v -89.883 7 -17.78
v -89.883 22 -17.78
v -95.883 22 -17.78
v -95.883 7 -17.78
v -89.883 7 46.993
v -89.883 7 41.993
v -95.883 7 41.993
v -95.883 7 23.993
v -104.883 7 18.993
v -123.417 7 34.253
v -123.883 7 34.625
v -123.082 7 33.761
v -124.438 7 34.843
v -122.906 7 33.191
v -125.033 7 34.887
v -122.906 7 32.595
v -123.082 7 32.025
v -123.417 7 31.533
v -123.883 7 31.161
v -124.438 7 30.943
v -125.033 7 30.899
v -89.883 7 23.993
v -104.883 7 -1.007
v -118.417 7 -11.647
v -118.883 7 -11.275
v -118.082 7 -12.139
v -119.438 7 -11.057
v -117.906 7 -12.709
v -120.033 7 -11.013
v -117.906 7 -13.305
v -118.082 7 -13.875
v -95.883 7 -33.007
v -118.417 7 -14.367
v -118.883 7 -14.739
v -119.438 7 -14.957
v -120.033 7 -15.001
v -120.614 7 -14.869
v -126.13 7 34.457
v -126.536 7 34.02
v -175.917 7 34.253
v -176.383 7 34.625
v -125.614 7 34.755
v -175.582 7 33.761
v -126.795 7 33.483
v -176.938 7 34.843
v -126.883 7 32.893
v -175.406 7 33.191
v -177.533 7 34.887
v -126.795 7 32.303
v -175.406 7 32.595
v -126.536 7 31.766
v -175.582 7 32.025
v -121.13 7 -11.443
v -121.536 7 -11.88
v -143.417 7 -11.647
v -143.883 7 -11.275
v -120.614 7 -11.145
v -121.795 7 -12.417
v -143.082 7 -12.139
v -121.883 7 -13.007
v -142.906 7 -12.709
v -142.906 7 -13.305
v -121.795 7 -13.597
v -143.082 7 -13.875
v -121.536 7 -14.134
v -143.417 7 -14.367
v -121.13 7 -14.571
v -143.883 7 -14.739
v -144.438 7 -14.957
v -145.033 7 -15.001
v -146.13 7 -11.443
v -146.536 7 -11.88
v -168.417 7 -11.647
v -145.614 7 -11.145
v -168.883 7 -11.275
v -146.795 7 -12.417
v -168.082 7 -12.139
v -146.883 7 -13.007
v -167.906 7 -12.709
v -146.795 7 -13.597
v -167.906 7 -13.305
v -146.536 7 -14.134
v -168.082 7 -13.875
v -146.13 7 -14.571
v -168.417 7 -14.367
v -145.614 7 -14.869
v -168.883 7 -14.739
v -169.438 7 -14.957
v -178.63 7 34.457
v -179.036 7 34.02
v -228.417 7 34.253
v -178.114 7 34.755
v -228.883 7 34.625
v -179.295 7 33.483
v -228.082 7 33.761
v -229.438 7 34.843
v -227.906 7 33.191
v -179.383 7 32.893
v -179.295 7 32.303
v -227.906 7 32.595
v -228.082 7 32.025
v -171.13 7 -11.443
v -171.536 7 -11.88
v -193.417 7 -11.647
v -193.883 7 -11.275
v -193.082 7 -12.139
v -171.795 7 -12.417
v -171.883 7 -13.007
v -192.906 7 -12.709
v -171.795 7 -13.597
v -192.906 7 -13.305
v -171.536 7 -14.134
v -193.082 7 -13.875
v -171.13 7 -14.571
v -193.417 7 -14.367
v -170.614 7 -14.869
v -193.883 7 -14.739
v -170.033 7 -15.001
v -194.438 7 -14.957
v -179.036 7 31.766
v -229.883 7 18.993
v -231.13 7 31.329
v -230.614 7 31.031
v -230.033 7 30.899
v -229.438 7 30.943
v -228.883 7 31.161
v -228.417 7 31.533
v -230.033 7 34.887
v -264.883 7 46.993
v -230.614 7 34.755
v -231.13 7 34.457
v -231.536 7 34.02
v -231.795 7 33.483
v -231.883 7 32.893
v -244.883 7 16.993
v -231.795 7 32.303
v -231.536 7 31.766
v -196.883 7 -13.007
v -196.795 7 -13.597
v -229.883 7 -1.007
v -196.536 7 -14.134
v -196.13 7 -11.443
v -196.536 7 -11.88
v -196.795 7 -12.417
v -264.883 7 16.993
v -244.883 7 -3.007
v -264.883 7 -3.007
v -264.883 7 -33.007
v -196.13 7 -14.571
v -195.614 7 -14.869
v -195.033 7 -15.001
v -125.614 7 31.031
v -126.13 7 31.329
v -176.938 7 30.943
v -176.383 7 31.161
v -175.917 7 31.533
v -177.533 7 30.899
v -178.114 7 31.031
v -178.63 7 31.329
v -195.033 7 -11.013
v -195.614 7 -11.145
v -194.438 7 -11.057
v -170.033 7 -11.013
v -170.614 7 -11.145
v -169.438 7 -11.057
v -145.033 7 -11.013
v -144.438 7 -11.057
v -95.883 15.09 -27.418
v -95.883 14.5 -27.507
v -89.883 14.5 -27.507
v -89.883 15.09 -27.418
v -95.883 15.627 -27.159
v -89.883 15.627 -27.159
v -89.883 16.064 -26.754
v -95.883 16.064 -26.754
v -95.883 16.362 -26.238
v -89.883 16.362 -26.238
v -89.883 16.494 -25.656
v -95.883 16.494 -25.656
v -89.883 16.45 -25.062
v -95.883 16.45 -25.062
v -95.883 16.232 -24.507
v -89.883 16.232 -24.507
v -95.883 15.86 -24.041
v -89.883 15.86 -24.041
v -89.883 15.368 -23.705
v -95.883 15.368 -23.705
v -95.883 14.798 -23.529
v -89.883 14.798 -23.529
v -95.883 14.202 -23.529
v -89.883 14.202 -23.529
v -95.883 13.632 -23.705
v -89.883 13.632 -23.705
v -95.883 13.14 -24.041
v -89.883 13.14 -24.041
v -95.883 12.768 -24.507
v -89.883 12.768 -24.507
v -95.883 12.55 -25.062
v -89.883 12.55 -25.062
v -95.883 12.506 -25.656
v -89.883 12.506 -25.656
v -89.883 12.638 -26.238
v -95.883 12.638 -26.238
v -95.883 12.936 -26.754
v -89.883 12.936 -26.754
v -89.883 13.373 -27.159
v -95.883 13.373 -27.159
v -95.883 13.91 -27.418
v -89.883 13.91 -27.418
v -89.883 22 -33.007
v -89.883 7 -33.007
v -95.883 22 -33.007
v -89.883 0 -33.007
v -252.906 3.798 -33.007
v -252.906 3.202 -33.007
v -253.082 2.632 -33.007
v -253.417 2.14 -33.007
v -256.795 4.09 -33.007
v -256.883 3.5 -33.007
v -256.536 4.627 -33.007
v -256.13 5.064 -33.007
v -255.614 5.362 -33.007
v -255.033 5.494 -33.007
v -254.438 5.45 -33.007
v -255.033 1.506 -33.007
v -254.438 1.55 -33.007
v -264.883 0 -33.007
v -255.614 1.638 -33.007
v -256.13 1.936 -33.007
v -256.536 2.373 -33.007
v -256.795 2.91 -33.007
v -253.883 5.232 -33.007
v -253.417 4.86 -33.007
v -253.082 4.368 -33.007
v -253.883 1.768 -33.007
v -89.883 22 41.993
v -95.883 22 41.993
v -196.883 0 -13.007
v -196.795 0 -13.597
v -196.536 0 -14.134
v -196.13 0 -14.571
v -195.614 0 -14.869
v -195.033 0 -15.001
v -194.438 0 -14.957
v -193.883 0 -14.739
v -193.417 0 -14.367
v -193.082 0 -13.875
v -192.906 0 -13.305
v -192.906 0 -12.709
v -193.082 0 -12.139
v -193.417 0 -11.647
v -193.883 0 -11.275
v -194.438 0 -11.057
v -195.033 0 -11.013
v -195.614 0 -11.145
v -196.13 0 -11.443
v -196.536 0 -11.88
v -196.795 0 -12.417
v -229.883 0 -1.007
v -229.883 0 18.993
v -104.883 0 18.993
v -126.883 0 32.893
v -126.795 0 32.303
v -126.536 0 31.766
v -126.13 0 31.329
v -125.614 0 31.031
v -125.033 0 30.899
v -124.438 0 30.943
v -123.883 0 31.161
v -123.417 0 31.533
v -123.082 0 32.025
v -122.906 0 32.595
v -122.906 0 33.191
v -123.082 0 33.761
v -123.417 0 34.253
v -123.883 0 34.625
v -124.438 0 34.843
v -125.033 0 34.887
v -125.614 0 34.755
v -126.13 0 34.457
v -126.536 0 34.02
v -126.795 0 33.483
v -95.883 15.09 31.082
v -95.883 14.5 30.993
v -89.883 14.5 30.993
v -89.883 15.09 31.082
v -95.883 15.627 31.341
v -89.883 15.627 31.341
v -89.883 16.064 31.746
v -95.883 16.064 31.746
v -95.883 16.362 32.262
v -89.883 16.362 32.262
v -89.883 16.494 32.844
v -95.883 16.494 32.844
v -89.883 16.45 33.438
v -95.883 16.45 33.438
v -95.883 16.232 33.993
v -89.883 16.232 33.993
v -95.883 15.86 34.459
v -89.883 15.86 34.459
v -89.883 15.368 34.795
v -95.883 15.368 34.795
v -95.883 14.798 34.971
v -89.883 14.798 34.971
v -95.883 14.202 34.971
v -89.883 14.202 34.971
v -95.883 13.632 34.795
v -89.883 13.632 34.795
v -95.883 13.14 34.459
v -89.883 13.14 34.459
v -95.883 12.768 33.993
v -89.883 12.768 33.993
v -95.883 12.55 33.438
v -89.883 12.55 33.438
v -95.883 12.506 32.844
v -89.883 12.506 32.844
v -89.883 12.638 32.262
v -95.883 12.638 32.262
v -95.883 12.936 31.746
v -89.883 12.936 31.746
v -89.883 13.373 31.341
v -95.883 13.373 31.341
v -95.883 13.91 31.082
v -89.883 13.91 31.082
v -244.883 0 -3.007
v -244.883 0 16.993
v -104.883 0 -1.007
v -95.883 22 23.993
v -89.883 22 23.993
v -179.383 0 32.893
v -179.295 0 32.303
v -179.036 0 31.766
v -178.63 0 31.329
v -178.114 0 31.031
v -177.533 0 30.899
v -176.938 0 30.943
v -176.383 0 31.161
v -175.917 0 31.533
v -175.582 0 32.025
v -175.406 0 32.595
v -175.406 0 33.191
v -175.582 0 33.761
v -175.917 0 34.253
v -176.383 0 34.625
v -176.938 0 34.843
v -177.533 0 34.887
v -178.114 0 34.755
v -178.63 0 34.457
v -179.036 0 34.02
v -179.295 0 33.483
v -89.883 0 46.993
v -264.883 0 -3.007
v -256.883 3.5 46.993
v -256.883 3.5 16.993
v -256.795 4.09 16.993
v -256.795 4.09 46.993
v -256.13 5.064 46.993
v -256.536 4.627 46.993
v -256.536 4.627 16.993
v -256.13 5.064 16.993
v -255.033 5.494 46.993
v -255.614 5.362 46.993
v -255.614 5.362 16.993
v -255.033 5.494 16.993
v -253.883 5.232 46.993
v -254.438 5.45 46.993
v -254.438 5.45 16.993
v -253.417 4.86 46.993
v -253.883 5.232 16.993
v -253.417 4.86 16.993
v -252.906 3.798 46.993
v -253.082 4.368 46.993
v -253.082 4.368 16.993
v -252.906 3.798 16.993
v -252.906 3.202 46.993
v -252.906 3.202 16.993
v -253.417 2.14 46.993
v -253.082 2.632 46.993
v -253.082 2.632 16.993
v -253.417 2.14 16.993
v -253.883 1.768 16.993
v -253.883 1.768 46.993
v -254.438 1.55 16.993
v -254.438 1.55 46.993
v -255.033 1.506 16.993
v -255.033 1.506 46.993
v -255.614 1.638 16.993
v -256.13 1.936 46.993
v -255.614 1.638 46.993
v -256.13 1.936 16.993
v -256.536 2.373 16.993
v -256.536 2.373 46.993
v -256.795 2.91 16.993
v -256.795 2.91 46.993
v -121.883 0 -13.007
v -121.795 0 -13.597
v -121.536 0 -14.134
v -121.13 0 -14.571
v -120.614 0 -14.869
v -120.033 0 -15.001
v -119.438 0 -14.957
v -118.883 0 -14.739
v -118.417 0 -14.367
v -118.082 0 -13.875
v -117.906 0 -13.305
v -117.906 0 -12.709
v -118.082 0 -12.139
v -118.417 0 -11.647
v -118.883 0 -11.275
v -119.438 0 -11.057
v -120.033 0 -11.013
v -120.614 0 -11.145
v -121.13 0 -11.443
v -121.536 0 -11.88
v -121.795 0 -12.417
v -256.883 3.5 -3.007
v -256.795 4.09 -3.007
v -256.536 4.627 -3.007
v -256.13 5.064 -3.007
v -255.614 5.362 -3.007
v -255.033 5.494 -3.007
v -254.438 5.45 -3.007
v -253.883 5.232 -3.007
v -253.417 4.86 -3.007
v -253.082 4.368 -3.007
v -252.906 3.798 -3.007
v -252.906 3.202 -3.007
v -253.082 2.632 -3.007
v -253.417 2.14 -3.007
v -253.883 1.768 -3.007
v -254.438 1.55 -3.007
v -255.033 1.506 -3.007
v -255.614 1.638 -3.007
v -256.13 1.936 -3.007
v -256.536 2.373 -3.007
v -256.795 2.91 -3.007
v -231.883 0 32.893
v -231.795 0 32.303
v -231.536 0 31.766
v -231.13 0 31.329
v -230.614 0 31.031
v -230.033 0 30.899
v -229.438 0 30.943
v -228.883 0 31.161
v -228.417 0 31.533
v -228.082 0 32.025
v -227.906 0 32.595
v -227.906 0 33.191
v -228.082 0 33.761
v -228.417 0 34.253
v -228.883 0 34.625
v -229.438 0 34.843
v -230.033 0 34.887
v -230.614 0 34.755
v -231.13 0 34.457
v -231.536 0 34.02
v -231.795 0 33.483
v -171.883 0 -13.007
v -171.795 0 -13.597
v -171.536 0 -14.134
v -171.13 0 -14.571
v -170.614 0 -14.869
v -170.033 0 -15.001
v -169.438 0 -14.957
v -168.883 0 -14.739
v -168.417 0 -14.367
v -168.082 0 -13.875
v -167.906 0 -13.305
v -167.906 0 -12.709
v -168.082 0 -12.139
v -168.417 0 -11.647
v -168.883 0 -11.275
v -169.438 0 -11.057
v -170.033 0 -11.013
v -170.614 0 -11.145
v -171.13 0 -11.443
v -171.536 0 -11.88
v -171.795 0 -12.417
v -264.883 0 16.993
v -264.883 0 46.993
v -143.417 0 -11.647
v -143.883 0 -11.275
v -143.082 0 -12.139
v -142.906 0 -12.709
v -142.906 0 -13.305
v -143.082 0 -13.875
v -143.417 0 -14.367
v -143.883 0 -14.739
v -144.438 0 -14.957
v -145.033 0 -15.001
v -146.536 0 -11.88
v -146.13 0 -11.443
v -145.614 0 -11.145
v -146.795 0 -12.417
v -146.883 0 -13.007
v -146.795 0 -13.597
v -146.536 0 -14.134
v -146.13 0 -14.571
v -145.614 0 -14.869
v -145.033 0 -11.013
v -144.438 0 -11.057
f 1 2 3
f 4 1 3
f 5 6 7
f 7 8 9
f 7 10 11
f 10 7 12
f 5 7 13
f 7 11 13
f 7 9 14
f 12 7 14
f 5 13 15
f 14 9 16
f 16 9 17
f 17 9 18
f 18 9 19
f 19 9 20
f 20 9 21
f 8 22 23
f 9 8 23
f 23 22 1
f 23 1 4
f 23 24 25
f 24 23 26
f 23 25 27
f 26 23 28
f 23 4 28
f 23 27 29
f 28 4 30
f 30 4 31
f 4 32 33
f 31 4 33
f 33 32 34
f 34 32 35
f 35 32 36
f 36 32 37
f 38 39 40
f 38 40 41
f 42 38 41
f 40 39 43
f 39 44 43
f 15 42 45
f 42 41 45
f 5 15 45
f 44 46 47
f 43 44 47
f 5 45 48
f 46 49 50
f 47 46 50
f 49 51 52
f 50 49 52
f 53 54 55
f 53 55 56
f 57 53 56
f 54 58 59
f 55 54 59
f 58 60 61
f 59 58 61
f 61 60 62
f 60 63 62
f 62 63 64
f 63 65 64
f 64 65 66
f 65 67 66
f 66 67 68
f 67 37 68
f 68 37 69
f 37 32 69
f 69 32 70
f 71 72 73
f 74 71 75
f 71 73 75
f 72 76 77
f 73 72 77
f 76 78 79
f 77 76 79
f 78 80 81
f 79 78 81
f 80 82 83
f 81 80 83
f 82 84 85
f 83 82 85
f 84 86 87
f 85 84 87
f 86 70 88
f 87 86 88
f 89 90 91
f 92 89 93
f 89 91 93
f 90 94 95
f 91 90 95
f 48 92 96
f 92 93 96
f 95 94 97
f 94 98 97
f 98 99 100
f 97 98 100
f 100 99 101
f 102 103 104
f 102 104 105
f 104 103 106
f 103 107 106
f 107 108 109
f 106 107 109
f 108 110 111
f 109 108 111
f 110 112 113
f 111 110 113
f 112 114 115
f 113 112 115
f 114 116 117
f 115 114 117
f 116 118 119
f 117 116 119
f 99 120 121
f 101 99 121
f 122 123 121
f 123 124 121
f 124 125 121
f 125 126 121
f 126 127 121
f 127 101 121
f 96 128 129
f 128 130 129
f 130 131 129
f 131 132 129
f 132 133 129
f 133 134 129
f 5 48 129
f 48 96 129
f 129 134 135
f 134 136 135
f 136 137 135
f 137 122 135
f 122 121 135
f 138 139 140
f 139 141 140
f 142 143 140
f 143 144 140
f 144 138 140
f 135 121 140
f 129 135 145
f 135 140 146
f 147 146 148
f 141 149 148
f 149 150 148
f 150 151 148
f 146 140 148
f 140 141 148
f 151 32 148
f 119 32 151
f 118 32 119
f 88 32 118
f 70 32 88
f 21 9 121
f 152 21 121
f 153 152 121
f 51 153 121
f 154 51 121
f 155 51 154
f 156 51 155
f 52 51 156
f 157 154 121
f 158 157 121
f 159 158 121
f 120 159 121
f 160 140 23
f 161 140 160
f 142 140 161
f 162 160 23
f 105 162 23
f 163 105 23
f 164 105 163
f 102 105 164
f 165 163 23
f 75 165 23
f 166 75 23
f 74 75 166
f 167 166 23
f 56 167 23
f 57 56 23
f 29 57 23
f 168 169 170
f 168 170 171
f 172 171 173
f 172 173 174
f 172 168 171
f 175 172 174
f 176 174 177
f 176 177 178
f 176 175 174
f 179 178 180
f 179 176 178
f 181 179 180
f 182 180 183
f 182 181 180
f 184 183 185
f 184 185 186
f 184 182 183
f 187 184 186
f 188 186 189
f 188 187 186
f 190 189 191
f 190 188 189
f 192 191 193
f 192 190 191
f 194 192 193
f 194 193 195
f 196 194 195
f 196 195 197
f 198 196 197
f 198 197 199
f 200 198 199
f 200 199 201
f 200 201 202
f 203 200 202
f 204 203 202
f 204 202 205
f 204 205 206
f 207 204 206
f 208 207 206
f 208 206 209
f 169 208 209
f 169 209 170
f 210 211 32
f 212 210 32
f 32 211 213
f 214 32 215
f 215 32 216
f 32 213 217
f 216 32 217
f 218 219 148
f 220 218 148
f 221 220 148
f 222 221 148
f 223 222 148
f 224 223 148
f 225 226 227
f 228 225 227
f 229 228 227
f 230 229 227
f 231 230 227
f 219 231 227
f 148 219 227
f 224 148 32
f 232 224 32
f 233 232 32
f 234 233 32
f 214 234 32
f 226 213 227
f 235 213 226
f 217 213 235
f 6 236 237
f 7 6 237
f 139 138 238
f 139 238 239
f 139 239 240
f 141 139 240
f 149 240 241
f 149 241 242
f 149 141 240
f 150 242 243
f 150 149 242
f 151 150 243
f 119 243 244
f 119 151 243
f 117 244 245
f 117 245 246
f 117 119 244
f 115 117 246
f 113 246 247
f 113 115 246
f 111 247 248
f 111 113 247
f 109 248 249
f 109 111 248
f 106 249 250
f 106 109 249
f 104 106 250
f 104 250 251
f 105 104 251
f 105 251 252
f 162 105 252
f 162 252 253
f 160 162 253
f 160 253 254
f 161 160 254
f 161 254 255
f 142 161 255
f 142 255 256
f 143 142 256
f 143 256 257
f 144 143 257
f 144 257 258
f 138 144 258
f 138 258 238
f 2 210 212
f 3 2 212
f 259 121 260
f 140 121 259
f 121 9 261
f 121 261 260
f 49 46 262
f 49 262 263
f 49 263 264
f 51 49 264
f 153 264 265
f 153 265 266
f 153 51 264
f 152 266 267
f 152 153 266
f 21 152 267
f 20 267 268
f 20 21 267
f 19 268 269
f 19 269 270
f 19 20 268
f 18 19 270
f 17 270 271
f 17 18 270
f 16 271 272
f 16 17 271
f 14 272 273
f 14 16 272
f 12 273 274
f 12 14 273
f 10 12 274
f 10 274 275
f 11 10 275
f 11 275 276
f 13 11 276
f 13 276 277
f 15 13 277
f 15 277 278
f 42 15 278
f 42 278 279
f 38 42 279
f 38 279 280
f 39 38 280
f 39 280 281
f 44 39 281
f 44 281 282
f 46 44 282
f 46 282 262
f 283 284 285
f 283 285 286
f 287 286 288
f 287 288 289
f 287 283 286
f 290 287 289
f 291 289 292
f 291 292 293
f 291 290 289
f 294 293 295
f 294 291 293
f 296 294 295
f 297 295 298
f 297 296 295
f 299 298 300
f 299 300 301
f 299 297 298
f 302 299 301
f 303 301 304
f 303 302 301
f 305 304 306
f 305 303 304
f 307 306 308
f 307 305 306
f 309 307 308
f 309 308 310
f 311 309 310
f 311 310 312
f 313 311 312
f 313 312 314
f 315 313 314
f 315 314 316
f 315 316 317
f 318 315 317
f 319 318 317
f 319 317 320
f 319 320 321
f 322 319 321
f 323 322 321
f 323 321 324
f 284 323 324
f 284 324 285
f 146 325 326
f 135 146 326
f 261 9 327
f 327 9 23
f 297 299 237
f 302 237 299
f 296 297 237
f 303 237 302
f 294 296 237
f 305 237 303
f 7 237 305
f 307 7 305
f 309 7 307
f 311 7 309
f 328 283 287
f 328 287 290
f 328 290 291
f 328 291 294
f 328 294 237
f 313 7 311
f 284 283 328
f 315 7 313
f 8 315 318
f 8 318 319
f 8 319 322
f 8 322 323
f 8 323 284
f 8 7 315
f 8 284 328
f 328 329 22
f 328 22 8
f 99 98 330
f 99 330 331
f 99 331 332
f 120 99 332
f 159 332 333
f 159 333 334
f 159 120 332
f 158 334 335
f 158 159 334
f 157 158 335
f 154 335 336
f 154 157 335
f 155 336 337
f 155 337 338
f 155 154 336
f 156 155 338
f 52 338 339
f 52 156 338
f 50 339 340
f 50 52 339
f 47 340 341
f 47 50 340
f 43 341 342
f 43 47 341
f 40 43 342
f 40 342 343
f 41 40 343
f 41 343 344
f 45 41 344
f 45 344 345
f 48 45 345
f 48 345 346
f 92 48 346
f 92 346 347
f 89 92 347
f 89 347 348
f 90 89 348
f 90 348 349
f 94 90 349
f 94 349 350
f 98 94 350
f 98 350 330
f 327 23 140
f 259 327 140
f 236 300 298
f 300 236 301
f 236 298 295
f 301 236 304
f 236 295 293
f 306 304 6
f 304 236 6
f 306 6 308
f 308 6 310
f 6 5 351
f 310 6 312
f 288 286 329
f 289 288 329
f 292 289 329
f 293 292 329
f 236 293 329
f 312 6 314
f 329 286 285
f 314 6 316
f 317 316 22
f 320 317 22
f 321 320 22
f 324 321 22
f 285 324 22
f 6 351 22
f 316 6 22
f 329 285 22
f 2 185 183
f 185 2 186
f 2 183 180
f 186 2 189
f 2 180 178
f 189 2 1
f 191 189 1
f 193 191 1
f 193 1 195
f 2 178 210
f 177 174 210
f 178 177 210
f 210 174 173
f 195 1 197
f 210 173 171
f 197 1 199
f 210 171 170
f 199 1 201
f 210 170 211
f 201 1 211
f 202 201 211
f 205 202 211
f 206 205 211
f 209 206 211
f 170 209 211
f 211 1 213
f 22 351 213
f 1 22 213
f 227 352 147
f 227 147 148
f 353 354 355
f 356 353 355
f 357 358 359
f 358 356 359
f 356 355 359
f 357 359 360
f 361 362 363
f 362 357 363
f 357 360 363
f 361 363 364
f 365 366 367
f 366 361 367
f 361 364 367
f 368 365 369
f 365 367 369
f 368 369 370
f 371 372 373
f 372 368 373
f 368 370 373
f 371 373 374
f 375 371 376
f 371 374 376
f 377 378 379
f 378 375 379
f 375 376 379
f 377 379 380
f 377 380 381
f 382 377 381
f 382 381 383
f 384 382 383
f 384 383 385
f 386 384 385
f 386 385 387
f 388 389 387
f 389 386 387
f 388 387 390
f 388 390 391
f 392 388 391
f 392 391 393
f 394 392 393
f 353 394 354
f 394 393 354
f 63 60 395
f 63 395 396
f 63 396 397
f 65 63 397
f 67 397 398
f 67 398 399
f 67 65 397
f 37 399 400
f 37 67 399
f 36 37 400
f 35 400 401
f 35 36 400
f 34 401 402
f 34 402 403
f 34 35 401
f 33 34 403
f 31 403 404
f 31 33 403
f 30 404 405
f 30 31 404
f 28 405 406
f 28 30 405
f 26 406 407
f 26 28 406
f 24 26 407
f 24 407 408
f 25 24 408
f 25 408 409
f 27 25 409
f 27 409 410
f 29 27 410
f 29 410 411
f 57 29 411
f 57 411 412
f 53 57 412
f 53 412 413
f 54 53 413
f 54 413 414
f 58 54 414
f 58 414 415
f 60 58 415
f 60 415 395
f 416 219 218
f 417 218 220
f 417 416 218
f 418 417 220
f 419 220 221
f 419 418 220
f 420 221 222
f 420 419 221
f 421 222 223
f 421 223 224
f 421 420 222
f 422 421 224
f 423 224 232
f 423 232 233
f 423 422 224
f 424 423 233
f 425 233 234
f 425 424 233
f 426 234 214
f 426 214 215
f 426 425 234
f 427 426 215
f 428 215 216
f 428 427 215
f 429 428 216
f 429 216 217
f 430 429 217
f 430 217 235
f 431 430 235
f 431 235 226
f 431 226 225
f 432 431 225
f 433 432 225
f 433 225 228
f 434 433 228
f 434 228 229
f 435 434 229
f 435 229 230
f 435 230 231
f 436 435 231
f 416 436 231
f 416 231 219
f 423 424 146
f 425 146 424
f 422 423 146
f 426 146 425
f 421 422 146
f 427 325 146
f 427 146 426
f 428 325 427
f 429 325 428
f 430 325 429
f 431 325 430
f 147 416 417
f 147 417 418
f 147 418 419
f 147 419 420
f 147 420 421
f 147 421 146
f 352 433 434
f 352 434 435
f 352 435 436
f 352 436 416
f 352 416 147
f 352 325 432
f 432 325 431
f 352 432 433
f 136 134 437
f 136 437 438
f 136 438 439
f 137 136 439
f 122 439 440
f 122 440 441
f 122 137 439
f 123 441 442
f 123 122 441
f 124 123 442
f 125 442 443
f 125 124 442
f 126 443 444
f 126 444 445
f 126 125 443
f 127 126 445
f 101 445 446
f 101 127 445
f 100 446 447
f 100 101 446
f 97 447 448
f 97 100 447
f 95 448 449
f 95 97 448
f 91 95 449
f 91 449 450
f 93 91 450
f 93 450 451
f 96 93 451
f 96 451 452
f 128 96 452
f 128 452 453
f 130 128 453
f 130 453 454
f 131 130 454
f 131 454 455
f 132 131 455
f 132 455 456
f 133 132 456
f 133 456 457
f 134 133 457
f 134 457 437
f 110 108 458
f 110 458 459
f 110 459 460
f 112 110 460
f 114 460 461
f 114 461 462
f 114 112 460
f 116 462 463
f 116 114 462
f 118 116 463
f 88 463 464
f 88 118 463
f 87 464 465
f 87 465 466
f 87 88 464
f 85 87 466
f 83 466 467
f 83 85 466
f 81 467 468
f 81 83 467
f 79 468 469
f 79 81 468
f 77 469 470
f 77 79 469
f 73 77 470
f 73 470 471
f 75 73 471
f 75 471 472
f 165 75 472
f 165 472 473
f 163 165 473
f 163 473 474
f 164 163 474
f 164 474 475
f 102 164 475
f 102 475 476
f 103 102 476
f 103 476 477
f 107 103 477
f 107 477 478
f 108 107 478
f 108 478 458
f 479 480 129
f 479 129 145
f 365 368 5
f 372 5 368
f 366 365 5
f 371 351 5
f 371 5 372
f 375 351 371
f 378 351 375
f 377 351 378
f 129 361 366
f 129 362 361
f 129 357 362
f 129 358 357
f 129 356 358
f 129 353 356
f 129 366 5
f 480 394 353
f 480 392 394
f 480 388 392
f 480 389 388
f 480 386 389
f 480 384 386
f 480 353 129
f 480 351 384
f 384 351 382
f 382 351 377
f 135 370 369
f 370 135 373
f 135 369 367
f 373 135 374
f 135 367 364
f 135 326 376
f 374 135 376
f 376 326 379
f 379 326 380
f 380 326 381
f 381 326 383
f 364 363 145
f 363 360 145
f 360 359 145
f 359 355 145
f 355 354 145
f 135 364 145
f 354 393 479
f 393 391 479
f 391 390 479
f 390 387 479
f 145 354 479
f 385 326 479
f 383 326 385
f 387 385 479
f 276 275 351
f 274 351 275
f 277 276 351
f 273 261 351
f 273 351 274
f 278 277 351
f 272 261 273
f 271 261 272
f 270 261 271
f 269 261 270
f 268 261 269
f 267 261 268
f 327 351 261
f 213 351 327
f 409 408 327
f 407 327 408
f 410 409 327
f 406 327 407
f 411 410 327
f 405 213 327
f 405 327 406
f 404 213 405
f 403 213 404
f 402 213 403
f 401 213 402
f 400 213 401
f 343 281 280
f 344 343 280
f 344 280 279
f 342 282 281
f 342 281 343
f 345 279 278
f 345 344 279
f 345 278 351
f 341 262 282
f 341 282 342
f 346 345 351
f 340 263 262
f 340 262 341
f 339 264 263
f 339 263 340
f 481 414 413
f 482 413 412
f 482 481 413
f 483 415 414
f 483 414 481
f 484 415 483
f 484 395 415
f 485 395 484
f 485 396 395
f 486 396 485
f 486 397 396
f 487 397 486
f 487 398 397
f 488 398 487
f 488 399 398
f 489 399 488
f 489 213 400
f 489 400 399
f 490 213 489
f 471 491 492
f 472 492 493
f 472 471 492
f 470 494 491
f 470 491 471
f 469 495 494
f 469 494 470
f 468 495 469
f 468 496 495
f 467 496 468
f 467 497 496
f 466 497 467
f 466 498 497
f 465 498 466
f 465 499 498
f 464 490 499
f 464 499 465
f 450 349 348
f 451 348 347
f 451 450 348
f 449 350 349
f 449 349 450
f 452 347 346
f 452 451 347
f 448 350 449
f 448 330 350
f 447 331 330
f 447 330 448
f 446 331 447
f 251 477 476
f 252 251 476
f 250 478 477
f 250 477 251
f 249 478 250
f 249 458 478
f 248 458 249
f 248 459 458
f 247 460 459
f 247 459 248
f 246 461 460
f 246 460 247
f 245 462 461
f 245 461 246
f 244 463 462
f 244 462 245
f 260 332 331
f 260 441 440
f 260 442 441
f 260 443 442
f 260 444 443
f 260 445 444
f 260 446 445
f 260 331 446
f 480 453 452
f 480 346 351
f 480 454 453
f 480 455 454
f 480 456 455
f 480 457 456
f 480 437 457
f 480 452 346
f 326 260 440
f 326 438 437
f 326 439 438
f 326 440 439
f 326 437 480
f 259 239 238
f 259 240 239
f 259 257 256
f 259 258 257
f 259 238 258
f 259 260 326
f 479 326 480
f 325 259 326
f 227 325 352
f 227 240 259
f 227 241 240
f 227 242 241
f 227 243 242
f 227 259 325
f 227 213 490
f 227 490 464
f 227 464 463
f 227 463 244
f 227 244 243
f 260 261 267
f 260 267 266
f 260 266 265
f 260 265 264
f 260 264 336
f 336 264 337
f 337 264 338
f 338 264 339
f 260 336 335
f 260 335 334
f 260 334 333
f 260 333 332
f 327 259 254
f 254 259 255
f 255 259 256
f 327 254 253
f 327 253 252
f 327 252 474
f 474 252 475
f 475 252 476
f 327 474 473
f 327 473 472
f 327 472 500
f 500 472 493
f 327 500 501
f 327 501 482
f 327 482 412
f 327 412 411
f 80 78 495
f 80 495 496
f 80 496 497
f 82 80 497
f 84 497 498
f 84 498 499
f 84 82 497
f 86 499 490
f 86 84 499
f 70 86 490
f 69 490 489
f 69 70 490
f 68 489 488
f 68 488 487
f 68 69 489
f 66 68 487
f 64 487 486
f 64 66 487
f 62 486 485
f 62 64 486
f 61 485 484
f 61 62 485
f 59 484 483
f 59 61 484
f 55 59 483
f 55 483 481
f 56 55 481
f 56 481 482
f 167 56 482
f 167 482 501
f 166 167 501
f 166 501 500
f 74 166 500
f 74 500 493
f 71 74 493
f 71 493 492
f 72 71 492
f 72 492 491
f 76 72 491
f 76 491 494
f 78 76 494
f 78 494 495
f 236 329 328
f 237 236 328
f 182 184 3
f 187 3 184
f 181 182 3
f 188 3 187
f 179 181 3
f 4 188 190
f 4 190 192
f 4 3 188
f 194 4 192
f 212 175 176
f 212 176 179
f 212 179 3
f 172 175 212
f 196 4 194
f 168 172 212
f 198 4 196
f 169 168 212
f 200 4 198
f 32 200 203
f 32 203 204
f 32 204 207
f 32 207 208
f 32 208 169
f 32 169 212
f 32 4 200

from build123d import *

# Parameters (mm, degrees)
SKETCH1_W               = 175
SKETCH1_H               = 80
BOSS_EXTRUDE1_DEPTH     = 7
SKETCH2_R               = 2
CUT_EXTRUDE1_DEPTH      = 10
SKETCH3_W               = 125
SKETCH3_H               = 20
CUT_EXTRUDE2_DEPTH      = 1
SKETCH7_W               = 6
SKETCH7_H               = 15.226692755
SKETCH7_H_2             = 18
BOSS_EXTRUDE3_DEPTH     = 15
SKETCH8_R               = 2
CUT_EXTRUDE4_DEPTH      = 15
SKETCH9_W               = 20
SKETCH9_H               = 20
CUT_EXTRUDE5_DEPTH      = 15
SKETCH10_R              = 2
CUT_EXTRUDE7_DEPTH      = 51
CUT_EXTRUDE7_DEPTH_BACK = 31
SKETCH3_3_W             = 125
SKETCH3_3_H             = 20
CUT_EXTRUDE8_DEPTH      = 10
SKETCH11_R              = 2
CUT_EXTRUDE9_DEPTH      = 10


with BuildPart() as part:
    # Sketch1 → Boss-Extrude1 (new body)
    with BuildSketch(Plane(origin=(0, 0, 0), x_dir=(1, 0, 0), z_dir=(0, 1, 0))):
        with Locations((-2.383449883, -6.993006993)):
            Rectangle(SKETCH1_W, SKETCH1_H)
    extrude(amount=BOSS_EXTRUDE1_DEPTH)

    # Sketch2 → Cut-Extrude1 (cut)
    with BuildSketch(Plane(origin=(0, 7, 0), x_dir=(1, 0, 0), z_dir=(0, 1, 0))):
        with Locations((-54.883449883, -32.893006993)):
            Circle(SKETCH2_R)
        with Locations((-2.383449883, -32.893006993)):
            Circle(SKETCH2_R)
        with Locations((50.116550117, -32.893006993)):
            Circle(SKETCH2_R)
    extrude(amount=-CUT_EXTRUDE1_DEPTH, mode=Mode.SUBTRACT)

    # Sketch3 → Cut-Extrude2 (cut)
    with BuildSketch(Plane(origin=(0, 7, 0), x_dir=(1, 0, 0), z_dir=(0, 1, 0))):
        with Locations((-12.383449883, -8.993006993)):
            Rectangle(SKETCH3_W, SKETCH3_H)
    extrude(amount=-CUT_EXTRUDE2_DEPTH, mode=Mode.SUBTRACT)

    # Sketch7 → Boss-Extrude3 (add)
    with BuildSketch(Plane(origin=(0, 7, 0), x_dir=(1, 0, 0), z_dir=(0, 1, 0))):
        with Locations((-86.883449883, 25.39364663)):
            Rectangle(SKETCH7_W, SKETCH7_H)
        with Locations((-86.883449883, -32.993006993)):
            Rectangle(SKETCH7_W, SKETCH7_H_2)
    extrude(amount=BOSS_EXTRUDE3_DEPTH)

    # Sketch8 → Cut-Extrude4 (cut)
    with BuildSketch(Plane(origin=(-83.883449883, 0, 0), x_dir=(0, 0, -1), z_dir=(1, 0, 0))):
        with Locations((25.506993007, 14.5)):
            Circle(SKETCH8_R)
        with Locations((-32.993006993, 14.5)):
            Circle(SKETCH8_R)
    extrude(amount=-CUT_EXTRUDE4_DEPTH, mode=Mode.SUBTRACT)

    # Sketch9 → Cut-Extrude5 (cut)
    with BuildSketch(Plane.XZ):
        with Locations((75.116550117, 6.993006993)):
            Rectangle(SKETCH9_W, SKETCH9_H)
    extrude(amount=-CUT_EXTRUDE5_DEPTH, mode=Mode.SUBTRACT)

    # Sketch10 → Cut-Extrude7 (cut, two sides)
    with BuildSketch(Plane.XY.offset(-3.006993007)) as cut_extrude7_sk:
        with Locations((75.116550117, 3.5)):
            Circle(SKETCH10_R)
    extrude(amount=CUT_EXTRUDE7_DEPTH, mode=Mode.SUBTRACT)
    extrude(cut_extrude7_sk.sketch, amount=-CUT_EXTRUDE7_DEPTH_BACK, mode=Mode.SUBTRACT)

    # Sketch3<3> → Cut-Extrude8 (cut)
    with BuildSketch(Plane(origin=(0, 7, 0), x_dir=(1, 0, 0), z_dir=(0, 1, 0))):
        with Locations((-12.383449883, -8.993006993)):
            Rectangle(SKETCH3_3_W, SKETCH3_3_H)
    extrude(amount=-CUT_EXTRUDE8_DEPTH, mode=Mode.SUBTRACT)

    # Sketch11 → Cut-Extrude9 (cut)
    with BuildSketch(Plane(origin=(0, 7, 0), x_dir=(1, 0, 0), z_dir=(0, 1, 0))):
        with Locations((-59.883449883, 13.006993007)):
            Circle(SKETCH11_R)
        with Locations((-34.883449883, 13.006993007)):
            Circle(SKETCH11_R)
        with Locations((-9.883449883, 13.006993007)):
            Circle(SKETCH11_R)
        with Locations((15.116550117, 13.006993007)):
            Circle(SKETCH11_R)
    extrude(amount=-CUT_EXTRUDE9_DEPTH, mode=Mode.SUBTRACT)


with BuildPart() as body_2:
    # Mirror2: mirrored copy
    add(part.part.mirror(Plane(origin=(-89.883449883, 7, -33.006993007), x_dir=(0, 0, 1), z_dir=(1, 0, 0))))


solid = body_2.part
